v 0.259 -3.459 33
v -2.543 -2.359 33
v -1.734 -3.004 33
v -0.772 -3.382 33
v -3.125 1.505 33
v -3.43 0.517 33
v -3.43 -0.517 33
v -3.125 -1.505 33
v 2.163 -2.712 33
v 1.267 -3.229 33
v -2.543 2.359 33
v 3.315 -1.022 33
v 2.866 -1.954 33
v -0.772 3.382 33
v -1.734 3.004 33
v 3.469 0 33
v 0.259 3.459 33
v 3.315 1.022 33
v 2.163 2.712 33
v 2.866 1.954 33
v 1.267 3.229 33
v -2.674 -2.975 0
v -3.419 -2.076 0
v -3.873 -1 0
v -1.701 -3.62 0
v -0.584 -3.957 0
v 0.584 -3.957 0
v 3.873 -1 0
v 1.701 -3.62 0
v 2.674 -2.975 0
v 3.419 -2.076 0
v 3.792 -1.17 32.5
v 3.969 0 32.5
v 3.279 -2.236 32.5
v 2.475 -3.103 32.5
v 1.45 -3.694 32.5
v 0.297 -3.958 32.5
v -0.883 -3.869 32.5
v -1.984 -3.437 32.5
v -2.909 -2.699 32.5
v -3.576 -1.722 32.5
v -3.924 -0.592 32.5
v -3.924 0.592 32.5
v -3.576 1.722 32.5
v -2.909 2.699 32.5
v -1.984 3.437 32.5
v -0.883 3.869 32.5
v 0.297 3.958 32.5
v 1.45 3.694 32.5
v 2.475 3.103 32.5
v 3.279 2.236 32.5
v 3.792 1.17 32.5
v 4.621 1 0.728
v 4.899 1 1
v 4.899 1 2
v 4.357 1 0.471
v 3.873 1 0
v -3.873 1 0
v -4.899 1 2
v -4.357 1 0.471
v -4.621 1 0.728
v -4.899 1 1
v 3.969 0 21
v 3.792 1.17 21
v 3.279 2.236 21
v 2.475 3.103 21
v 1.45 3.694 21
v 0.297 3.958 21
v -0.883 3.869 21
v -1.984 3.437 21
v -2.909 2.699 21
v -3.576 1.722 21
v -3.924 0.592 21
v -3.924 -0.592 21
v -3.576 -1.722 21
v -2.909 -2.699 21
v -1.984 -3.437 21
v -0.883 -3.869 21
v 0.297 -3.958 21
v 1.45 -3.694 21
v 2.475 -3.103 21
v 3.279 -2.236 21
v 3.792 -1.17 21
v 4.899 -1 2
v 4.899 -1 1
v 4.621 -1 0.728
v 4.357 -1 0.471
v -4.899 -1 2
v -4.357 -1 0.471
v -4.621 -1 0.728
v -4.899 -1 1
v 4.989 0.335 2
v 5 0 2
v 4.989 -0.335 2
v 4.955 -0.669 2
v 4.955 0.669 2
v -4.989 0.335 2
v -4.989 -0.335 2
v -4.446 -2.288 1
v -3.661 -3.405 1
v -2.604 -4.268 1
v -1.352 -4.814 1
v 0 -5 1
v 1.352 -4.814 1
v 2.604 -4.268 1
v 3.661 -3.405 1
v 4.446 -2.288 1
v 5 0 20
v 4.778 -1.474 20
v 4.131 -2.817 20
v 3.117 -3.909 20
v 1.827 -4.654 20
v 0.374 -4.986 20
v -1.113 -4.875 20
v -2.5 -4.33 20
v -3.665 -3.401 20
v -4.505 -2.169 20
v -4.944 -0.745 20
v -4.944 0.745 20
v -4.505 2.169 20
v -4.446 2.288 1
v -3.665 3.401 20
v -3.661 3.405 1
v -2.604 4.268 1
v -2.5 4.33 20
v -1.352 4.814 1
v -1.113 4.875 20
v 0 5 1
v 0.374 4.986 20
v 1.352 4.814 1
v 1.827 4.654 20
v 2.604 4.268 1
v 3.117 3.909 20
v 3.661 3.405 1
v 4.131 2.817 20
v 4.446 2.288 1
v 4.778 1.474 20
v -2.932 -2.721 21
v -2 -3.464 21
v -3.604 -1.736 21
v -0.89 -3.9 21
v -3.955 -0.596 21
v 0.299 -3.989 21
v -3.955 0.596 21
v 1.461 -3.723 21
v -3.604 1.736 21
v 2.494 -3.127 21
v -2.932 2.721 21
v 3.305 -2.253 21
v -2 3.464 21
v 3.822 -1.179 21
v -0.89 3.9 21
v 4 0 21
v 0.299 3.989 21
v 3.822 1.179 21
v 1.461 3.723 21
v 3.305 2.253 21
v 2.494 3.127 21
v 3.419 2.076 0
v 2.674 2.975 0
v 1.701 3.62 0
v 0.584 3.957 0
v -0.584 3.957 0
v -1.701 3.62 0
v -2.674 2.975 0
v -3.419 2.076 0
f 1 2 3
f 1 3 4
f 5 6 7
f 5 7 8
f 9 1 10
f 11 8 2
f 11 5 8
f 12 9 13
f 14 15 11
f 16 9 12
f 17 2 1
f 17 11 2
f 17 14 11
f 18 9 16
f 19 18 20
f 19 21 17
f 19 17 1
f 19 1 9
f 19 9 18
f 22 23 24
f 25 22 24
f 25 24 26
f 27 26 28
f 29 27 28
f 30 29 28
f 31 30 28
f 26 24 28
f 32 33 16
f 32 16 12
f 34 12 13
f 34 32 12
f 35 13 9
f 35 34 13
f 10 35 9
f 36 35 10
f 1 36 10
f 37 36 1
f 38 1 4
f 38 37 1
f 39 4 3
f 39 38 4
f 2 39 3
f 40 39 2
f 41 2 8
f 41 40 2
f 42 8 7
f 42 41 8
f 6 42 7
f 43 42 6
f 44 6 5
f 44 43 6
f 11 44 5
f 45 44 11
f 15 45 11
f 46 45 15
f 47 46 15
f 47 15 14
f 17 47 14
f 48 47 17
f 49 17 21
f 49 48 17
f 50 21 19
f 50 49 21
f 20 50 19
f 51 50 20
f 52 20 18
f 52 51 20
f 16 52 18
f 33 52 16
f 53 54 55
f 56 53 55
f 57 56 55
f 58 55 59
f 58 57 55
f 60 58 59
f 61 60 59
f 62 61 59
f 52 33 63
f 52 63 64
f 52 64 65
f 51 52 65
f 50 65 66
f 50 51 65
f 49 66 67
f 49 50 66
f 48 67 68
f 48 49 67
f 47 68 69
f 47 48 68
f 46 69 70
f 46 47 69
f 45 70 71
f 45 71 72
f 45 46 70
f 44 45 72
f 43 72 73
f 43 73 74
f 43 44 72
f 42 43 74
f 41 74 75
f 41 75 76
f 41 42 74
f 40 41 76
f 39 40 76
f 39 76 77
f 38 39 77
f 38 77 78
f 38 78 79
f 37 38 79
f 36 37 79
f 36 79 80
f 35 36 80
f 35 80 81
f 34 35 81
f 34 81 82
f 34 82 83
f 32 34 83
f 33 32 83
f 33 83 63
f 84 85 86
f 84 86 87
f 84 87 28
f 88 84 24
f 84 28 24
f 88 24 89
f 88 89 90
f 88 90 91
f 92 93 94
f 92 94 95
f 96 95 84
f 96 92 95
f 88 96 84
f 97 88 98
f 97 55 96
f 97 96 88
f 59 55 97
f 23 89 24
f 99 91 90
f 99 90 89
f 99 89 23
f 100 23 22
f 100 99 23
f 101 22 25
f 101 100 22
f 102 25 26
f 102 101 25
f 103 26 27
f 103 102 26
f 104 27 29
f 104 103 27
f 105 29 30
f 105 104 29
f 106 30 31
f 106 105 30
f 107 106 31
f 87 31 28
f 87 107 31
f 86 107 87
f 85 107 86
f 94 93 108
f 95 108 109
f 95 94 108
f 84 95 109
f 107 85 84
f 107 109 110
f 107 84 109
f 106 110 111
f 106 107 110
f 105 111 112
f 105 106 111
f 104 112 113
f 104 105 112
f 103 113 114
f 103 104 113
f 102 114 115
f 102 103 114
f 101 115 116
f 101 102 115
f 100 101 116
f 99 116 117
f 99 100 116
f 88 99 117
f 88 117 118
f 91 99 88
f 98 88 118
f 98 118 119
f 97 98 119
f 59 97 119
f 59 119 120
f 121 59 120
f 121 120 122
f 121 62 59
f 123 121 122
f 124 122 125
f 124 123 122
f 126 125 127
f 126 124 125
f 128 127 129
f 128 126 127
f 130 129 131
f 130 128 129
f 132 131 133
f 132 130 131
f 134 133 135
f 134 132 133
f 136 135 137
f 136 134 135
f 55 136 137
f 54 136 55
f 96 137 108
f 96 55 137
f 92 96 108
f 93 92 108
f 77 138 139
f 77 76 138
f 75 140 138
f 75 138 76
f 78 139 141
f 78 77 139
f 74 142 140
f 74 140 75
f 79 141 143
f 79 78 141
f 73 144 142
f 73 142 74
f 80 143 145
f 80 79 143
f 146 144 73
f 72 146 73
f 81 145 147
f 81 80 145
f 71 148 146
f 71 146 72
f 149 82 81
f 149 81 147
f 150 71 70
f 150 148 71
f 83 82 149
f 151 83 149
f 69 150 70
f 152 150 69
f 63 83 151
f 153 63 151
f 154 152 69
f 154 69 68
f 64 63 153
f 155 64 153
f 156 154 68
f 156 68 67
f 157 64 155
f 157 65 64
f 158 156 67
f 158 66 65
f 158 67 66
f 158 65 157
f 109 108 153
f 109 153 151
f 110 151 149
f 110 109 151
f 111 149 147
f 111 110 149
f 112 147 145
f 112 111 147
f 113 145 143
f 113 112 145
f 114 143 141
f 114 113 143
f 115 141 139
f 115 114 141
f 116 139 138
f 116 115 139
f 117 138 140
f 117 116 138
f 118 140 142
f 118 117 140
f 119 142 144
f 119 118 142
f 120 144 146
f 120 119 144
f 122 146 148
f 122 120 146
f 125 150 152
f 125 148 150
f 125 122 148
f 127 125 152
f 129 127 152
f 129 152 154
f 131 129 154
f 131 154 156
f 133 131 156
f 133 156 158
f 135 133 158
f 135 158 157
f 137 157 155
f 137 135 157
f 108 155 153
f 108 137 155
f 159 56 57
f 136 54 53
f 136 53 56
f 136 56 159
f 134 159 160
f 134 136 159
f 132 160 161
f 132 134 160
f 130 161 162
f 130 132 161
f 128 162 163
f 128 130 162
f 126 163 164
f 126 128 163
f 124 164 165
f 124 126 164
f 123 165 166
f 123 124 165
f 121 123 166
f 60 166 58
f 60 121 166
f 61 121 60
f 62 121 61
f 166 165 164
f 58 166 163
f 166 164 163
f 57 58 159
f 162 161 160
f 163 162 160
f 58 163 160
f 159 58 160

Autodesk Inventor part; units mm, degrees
ref_plane "YZ Plane" through (0, 0, 0) normal (1, 0, 0) x (0, 1, 0)
ref_plane "XZ Plane" through (0, 0, 0) normal (0, 1, 0) x (-1, 0, 0)
ref_plane "XY Plane" through (0, 0, 0) normal (0, 0, 1) x (1, 0, 0)
sketch "Sketch1" plane through (0, 0, 0) normal (0, 0, 1) x (1, 0, 0)
  circle A0 centre (0, 0) radius 5
  dimension "d0" = 10
extrude "Extrusion1" add sketch "Sketch1" along normal blind 33
sketch "Sketch2" plane through (0, 0, 33) normal (0, 0, 1) x (1, 0, 0)
  circle A0 centre (0, 0) radius 5 projected
  circle A1 centre (0, 0) radius 3.9688
  dimension "d3" = 7.9375
extrude "Extrusion2" cut sketch "Sketch2" against normal blind 12
sketch "Sketch3" plane through (0, 0, 0) normal (0, 0, -1) x (-1, 0, 0)
  circle A0 centre (0, 0) radius 5 projected
  line L0 (-4.899, 1) -> (4.899, 1)
  line L1 (-4.899, -1) -> (4.899, -1)
  arc A1 (-4.899, 1) -> (-4.899, -1) centre (0, 0) ccw
  arc A2 (4.899, -1) -> (4.899, 1) centre (0, 0) ccw
  dimension "d6" = 2
  dimension "d8" = 1
extrude "Extrusion3" cut sketch "Sketch3" against normal blind 2 contours A0 L1 L0
chamfer "Chamfer1" distance 1 angle 45 3 edges at (0, 5, 0) (0, -5, 0) (-5, 0, 21)
thread "Thread1" size "5/16-18 UNC" class "2A" standard "ANSI Unified Screw Threads" full length
chamfer "Chamfer2" distance 0.5 angle 45 1 edges at (-3.9688, 0, 33)
properties part number "PINO ROSCADO(25)" material "Carbon Steel"
